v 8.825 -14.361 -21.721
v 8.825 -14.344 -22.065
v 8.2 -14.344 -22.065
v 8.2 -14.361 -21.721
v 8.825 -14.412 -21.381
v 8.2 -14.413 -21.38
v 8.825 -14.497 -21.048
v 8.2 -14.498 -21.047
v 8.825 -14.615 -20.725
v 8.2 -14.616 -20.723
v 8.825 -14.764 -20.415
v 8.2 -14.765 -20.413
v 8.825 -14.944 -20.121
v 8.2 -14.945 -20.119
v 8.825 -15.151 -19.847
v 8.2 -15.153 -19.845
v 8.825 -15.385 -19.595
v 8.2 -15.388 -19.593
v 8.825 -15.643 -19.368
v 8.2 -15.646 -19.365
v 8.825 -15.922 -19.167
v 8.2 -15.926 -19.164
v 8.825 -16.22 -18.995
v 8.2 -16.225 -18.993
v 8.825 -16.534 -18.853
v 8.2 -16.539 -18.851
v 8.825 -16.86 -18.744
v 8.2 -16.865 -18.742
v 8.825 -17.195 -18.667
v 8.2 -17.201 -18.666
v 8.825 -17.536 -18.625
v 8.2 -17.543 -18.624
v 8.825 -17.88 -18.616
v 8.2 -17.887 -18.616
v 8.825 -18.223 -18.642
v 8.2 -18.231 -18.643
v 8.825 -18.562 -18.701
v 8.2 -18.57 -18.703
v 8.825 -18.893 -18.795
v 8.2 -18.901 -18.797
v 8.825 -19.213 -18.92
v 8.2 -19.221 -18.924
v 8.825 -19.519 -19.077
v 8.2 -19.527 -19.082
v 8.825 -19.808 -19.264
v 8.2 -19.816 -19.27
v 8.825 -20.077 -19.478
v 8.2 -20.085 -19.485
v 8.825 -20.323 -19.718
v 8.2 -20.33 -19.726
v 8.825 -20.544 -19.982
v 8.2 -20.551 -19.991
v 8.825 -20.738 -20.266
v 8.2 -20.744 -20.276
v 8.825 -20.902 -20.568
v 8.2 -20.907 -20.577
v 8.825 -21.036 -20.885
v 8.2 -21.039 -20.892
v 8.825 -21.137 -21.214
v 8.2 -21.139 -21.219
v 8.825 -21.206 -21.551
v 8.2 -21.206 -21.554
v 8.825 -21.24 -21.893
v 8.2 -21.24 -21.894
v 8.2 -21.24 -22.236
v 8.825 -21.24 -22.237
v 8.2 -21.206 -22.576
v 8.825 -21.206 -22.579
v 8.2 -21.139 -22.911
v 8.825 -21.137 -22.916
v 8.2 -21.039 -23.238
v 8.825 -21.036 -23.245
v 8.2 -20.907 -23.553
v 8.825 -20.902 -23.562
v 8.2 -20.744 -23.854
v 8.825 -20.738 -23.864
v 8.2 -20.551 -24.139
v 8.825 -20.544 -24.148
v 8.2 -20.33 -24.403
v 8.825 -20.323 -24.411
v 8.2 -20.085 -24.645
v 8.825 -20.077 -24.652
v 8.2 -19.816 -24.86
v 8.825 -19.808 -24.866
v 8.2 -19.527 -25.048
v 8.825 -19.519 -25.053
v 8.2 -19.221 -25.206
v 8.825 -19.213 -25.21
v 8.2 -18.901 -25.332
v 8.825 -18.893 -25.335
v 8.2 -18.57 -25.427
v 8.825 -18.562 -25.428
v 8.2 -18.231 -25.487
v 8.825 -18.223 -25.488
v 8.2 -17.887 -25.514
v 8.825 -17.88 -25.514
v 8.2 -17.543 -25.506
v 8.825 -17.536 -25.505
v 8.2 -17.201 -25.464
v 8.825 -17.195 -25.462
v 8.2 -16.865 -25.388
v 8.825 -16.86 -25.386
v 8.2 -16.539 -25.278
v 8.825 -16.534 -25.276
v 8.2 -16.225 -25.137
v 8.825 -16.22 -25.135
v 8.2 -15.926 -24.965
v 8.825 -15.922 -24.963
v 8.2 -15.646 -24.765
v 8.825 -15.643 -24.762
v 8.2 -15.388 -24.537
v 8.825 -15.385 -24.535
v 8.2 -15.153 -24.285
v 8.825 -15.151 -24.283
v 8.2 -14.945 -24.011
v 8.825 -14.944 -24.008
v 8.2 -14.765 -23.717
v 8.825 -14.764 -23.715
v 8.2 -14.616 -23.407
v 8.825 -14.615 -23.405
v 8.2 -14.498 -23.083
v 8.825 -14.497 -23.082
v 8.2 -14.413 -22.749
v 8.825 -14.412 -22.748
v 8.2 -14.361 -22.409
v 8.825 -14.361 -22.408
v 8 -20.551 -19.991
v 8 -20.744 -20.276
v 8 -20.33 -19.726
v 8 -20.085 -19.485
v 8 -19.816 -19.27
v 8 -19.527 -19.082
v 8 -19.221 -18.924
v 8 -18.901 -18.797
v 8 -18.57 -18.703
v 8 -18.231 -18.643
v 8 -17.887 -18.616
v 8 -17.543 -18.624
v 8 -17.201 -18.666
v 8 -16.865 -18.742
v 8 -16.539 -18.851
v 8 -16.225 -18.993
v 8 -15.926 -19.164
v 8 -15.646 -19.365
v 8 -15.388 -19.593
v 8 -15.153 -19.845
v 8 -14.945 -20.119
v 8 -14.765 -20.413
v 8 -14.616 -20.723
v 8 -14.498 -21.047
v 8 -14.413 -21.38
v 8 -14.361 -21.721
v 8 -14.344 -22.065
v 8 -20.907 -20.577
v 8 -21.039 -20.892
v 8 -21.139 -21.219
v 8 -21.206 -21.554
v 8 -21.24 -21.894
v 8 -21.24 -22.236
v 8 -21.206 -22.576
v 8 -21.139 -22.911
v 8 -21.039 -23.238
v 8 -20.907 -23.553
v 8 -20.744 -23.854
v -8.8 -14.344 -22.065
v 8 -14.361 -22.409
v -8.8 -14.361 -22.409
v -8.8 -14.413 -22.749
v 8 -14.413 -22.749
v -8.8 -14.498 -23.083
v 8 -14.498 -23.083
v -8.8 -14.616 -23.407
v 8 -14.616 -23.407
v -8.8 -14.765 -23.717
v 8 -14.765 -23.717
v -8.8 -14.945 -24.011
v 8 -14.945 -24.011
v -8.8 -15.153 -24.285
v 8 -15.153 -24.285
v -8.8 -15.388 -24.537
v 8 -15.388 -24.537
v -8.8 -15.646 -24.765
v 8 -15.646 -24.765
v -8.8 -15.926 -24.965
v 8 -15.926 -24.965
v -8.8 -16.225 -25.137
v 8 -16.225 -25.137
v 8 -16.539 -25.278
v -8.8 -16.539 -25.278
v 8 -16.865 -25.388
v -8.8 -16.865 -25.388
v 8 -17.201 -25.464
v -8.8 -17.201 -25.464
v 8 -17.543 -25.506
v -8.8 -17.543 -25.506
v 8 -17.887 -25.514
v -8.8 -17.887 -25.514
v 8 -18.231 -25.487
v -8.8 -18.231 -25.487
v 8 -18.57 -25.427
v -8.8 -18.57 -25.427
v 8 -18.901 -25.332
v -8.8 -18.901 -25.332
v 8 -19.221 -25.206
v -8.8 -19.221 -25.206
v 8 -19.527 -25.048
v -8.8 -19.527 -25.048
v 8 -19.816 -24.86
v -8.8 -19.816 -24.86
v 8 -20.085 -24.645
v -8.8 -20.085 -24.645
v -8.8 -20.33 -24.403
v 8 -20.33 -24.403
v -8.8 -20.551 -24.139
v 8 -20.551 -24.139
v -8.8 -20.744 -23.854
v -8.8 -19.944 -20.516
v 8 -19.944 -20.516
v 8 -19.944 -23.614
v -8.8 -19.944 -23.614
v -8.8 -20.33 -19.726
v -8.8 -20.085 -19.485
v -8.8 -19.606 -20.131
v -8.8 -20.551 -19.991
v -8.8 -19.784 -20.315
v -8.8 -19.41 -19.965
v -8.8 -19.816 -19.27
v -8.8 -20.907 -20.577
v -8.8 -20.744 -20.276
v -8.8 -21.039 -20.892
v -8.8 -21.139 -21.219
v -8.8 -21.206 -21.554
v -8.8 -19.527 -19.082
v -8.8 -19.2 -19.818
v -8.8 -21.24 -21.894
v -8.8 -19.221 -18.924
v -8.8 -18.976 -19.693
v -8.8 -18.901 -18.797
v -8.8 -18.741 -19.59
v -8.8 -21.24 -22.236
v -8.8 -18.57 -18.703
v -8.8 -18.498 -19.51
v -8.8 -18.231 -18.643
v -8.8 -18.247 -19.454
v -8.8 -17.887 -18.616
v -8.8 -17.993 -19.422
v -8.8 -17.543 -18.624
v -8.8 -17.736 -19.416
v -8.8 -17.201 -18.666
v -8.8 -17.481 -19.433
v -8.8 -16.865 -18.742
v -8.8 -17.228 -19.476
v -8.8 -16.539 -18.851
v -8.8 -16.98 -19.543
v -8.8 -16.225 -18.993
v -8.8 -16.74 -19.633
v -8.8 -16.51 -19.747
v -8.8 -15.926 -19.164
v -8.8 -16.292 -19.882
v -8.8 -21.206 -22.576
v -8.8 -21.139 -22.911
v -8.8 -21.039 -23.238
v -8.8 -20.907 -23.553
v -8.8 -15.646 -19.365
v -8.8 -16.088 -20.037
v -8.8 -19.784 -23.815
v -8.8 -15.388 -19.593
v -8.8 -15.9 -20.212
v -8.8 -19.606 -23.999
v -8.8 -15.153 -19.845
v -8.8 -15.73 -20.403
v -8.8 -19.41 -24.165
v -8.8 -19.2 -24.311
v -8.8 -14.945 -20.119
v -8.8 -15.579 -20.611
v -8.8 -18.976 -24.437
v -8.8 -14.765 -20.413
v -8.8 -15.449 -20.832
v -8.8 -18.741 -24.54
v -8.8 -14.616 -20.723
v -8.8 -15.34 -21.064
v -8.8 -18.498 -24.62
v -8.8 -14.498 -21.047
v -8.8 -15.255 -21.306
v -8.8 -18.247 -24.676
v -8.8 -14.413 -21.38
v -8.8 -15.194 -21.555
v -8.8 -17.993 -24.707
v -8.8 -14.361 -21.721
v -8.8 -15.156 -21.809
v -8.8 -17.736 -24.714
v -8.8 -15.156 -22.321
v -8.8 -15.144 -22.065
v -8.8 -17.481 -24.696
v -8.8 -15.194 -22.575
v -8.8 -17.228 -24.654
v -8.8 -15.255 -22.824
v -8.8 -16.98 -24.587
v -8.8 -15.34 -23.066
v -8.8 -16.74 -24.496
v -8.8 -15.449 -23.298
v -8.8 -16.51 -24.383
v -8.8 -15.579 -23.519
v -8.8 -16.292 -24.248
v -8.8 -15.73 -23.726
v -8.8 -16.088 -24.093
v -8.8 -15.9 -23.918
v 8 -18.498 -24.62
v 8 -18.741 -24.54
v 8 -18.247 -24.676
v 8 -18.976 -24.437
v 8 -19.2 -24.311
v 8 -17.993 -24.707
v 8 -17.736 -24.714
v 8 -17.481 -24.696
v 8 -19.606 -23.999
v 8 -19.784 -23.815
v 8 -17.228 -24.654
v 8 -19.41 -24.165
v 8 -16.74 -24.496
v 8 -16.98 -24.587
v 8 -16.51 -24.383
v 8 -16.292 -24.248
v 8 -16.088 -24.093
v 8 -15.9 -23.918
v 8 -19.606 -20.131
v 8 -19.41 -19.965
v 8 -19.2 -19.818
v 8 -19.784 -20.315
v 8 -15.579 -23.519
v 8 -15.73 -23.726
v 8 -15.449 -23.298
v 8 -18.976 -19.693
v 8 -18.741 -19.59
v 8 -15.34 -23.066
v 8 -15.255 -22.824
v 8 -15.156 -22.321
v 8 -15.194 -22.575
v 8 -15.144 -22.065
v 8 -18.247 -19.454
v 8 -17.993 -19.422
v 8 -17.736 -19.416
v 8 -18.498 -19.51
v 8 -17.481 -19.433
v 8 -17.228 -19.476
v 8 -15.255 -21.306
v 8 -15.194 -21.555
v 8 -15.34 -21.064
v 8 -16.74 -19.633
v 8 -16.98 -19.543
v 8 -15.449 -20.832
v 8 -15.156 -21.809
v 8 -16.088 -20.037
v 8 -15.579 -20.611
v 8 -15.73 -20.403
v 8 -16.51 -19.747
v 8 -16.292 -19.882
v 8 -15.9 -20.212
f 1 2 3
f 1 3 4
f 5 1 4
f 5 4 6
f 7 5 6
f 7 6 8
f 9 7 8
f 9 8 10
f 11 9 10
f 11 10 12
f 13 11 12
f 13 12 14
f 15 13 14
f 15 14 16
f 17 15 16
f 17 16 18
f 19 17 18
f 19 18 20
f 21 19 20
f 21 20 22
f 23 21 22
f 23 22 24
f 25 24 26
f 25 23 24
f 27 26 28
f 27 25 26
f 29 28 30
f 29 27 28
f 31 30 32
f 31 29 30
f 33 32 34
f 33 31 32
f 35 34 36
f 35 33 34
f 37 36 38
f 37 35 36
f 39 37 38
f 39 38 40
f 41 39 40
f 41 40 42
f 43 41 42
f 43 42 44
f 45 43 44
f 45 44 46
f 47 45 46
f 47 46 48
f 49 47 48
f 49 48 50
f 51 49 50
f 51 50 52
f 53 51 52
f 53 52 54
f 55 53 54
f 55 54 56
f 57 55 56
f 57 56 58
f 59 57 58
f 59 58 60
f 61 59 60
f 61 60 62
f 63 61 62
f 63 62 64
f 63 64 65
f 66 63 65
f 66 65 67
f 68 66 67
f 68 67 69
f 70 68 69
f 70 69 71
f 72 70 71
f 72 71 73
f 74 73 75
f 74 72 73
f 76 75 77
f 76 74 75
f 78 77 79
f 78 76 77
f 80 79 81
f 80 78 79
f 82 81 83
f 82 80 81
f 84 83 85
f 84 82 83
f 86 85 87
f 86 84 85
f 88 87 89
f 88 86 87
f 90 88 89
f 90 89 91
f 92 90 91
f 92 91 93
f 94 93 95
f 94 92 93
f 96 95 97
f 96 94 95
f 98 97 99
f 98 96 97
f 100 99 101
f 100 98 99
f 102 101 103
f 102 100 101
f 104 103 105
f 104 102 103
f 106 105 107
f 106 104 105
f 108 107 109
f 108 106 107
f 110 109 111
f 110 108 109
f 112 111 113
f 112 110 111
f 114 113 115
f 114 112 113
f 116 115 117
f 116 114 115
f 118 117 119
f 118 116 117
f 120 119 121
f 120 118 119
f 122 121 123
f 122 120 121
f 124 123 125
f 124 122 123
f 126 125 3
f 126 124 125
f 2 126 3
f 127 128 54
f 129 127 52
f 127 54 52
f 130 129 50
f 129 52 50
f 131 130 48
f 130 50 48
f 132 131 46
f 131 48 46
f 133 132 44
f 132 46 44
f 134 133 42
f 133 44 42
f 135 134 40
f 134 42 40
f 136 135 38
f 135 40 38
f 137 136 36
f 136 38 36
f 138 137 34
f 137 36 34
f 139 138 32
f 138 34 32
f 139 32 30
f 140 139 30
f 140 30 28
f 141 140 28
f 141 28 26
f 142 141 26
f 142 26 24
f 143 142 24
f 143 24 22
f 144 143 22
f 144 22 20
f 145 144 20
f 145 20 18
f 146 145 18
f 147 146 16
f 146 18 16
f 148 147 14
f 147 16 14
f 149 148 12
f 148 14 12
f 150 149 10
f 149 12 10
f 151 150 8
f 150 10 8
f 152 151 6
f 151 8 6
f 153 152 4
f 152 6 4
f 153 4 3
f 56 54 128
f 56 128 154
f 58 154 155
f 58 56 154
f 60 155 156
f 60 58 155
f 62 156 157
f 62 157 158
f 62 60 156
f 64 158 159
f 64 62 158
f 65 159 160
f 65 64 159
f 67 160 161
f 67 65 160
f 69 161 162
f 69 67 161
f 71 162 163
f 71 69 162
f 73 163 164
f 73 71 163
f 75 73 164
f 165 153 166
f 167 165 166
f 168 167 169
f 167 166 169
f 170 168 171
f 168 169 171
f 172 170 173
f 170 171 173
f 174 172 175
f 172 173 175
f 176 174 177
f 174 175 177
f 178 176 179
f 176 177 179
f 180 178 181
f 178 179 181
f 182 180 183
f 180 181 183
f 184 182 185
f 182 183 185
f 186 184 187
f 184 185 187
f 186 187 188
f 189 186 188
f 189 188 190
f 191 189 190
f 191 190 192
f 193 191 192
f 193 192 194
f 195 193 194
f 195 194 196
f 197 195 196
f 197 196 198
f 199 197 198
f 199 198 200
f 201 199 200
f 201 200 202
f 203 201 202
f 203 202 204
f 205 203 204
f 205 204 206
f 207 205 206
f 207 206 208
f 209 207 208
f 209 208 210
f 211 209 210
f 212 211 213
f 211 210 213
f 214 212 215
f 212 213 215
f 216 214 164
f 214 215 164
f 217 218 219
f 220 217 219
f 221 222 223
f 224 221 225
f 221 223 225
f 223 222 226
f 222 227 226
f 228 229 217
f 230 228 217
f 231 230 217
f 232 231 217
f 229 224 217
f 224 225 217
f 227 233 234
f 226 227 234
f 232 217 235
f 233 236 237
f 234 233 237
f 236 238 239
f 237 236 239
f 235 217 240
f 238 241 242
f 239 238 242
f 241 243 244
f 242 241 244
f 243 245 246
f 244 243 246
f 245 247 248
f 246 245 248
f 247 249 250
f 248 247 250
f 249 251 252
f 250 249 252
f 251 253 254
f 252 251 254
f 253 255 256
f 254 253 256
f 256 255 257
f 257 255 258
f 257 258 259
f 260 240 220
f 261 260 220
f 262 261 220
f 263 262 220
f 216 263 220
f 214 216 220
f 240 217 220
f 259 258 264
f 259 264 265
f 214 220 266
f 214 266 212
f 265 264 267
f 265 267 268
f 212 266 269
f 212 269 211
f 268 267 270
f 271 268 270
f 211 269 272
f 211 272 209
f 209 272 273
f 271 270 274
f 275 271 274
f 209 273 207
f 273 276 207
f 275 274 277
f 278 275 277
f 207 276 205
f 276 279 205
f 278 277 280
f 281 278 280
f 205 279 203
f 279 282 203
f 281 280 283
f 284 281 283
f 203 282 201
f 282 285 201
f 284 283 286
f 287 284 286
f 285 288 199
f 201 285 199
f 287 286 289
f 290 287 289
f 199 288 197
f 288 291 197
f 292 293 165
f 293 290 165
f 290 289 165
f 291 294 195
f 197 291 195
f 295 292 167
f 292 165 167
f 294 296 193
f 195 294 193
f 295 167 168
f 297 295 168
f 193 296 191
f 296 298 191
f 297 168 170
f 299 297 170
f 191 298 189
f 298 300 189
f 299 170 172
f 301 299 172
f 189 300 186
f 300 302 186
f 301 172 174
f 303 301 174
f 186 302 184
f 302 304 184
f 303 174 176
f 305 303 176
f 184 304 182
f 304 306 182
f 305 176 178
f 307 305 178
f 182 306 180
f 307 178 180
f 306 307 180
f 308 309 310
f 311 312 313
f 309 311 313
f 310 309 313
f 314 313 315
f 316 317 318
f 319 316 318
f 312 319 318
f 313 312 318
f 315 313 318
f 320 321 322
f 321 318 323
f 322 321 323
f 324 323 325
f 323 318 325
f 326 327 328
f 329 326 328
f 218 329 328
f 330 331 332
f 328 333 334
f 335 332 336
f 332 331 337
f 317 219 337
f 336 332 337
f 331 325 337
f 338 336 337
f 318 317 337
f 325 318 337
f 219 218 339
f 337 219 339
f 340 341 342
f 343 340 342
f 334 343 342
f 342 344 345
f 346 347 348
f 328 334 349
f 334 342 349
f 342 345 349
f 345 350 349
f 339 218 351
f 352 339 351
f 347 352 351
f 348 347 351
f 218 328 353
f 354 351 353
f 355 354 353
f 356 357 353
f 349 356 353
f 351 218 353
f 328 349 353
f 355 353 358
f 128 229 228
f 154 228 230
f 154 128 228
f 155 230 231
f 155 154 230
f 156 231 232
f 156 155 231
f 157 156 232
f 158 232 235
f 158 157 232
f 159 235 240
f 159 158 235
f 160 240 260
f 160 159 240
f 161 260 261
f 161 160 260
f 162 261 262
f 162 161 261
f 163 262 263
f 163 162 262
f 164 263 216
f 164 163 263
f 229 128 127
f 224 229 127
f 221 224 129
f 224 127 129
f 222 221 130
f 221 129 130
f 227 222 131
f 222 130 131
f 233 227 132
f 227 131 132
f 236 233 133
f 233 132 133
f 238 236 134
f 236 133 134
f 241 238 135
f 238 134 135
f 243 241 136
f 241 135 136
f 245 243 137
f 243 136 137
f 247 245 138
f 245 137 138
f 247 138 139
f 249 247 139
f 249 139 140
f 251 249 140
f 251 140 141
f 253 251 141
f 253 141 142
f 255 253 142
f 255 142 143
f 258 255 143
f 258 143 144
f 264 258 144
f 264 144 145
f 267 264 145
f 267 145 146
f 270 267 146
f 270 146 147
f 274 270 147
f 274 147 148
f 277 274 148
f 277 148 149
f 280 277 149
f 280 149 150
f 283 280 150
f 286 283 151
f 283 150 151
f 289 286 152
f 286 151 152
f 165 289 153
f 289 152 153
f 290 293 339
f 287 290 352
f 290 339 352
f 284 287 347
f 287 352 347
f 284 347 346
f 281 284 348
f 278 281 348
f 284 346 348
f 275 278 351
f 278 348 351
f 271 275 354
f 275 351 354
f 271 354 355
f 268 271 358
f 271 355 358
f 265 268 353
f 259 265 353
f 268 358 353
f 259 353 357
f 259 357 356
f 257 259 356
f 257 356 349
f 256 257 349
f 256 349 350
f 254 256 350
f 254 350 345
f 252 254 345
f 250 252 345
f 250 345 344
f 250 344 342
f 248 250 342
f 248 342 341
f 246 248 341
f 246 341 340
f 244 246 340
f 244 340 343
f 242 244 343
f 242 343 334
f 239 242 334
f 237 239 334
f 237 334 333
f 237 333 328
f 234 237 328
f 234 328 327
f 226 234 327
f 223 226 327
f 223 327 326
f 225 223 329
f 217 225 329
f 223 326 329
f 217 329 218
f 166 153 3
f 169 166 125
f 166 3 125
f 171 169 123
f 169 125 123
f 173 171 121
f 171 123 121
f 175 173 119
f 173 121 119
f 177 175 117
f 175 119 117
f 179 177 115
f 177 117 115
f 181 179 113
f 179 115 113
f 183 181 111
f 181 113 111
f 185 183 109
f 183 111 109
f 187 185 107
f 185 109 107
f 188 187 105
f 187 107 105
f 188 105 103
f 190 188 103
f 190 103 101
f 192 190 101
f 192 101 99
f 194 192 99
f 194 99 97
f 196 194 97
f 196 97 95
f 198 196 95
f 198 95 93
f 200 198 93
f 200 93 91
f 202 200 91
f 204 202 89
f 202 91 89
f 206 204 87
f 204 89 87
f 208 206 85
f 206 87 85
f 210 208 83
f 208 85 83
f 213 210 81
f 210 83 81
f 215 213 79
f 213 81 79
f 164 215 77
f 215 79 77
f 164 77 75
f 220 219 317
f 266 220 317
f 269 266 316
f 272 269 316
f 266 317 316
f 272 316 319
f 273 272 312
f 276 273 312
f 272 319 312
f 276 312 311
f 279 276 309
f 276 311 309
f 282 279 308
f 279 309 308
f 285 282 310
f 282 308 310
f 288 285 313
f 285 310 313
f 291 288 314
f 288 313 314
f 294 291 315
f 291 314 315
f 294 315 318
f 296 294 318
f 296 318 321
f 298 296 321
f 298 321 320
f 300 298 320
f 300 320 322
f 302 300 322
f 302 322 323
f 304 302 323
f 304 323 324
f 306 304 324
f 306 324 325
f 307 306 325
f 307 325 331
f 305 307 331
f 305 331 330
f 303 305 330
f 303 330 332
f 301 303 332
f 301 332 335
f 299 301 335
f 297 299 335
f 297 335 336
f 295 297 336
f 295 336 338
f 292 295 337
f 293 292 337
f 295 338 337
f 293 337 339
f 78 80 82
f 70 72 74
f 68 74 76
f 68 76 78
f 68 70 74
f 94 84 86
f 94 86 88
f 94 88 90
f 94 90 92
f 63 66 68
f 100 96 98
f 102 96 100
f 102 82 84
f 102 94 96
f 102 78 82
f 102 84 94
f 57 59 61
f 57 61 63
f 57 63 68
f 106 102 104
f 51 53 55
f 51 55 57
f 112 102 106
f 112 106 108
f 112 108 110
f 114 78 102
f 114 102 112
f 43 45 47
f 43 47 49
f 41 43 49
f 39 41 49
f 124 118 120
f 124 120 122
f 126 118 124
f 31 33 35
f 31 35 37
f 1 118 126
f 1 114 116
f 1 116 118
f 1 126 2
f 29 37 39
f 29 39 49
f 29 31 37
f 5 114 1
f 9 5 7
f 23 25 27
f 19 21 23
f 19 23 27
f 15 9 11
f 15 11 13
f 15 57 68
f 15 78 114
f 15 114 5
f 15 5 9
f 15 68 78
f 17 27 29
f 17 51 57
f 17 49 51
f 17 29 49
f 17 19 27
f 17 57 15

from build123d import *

# Parameters (mm, degrees)
BOSS_EXTRUDE1_START = 0.2
BOSS_EXTRUDE1_DEPTH = 17
BOSS_EXTRUDE2_START = 0.825
SKETCH1_3_R         = 3.45
BOSS_EXTRUDE2_DEPTH = 0.825


with BuildPart() as part:
    # Sketch1 → Boss-Extrude1 (new body)
    # profile 1 of 2: a face of its own
    with BuildSketch(Plane(origin=(7.999998093, 0, 0), x_dir=(0, 0, -1), z_dir=(1, 0, 0)).offset(BOSS_EXTRUDE1_START)):
        with BuildLine():
            Line((23.853743883, -20.744040957), (20.276035119, -20.744040824))
            ThreePointArc((20.276035119, -20.744040824), (18.742240101, -16.865331986), (22.06488974, -14.344040891))
            ThreePointArc((22.06488974, -14.344040891), (25.387539191, -16.865332234), (23.853743883, -20.744040957))
        make_face()
        with BuildLine():
            ThreePointArc((23.61408287, -19.944040948), (24.586793684, -16.980099955), (22.06488971, -15.144040891))
            ThreePointArc((22.06488971, -15.144040891), (19.542985599, -16.980099767), (20.515696193, -19.944040833))
            Line((20.515696193, -19.944040833), (23.61408287, -19.944040948))
        make_face(mode=Mode.SUBTRACT)
    # profile 2 of 2: a face of its own
    with BuildSketch(Plane(origin=(7.999998093, 0, 0), x_dir=(0, 0, -1), z_dir=(1, 0, 0)).offset(BOSS_EXTRUDE1_START)):
        with BuildLine():
            ThreePointArc((20.276035119, -20.744040824), (22.064889483, -21.244040891), (23.853743883, -20.744040957))
            Line((23.853743883, -20.744040957), (20.276035119, -20.744040824))
        make_face()
    extrude(amount=-BOSS_EXTRUDE1_DEPTH)

    # Sketch1<3> → Boss-Extrude2 (add)
    with BuildSketch(Plane(origin=(7.999998093, 0, 0), x_dir=(0, 0, -1), z_dir=(1, 0, 0)).offset(BOSS_EXTRUDE2_START)):
        with Locations(Location((22.064889611, -17.794040891, 0), (0, 0, 90))):
            Circle(SKETCH1_3_R)
        with BuildLine():
            Line((23.853743883, -20.744040957), (20.276035119, -20.744040824))
            ThreePointArc((20.276035119, -20.744040824), (18.742240101, -16.865331986), (22.06488974, -14.344040891))
            ThreePointArc((22.06488974, -14.344040891), (25.387539191, -16.865332234), (23.853743883, -20.744040957))
        make_face()
    extrude(amount=-BOSS_EXTRUDE2_DEPTH)


solid = part.part
